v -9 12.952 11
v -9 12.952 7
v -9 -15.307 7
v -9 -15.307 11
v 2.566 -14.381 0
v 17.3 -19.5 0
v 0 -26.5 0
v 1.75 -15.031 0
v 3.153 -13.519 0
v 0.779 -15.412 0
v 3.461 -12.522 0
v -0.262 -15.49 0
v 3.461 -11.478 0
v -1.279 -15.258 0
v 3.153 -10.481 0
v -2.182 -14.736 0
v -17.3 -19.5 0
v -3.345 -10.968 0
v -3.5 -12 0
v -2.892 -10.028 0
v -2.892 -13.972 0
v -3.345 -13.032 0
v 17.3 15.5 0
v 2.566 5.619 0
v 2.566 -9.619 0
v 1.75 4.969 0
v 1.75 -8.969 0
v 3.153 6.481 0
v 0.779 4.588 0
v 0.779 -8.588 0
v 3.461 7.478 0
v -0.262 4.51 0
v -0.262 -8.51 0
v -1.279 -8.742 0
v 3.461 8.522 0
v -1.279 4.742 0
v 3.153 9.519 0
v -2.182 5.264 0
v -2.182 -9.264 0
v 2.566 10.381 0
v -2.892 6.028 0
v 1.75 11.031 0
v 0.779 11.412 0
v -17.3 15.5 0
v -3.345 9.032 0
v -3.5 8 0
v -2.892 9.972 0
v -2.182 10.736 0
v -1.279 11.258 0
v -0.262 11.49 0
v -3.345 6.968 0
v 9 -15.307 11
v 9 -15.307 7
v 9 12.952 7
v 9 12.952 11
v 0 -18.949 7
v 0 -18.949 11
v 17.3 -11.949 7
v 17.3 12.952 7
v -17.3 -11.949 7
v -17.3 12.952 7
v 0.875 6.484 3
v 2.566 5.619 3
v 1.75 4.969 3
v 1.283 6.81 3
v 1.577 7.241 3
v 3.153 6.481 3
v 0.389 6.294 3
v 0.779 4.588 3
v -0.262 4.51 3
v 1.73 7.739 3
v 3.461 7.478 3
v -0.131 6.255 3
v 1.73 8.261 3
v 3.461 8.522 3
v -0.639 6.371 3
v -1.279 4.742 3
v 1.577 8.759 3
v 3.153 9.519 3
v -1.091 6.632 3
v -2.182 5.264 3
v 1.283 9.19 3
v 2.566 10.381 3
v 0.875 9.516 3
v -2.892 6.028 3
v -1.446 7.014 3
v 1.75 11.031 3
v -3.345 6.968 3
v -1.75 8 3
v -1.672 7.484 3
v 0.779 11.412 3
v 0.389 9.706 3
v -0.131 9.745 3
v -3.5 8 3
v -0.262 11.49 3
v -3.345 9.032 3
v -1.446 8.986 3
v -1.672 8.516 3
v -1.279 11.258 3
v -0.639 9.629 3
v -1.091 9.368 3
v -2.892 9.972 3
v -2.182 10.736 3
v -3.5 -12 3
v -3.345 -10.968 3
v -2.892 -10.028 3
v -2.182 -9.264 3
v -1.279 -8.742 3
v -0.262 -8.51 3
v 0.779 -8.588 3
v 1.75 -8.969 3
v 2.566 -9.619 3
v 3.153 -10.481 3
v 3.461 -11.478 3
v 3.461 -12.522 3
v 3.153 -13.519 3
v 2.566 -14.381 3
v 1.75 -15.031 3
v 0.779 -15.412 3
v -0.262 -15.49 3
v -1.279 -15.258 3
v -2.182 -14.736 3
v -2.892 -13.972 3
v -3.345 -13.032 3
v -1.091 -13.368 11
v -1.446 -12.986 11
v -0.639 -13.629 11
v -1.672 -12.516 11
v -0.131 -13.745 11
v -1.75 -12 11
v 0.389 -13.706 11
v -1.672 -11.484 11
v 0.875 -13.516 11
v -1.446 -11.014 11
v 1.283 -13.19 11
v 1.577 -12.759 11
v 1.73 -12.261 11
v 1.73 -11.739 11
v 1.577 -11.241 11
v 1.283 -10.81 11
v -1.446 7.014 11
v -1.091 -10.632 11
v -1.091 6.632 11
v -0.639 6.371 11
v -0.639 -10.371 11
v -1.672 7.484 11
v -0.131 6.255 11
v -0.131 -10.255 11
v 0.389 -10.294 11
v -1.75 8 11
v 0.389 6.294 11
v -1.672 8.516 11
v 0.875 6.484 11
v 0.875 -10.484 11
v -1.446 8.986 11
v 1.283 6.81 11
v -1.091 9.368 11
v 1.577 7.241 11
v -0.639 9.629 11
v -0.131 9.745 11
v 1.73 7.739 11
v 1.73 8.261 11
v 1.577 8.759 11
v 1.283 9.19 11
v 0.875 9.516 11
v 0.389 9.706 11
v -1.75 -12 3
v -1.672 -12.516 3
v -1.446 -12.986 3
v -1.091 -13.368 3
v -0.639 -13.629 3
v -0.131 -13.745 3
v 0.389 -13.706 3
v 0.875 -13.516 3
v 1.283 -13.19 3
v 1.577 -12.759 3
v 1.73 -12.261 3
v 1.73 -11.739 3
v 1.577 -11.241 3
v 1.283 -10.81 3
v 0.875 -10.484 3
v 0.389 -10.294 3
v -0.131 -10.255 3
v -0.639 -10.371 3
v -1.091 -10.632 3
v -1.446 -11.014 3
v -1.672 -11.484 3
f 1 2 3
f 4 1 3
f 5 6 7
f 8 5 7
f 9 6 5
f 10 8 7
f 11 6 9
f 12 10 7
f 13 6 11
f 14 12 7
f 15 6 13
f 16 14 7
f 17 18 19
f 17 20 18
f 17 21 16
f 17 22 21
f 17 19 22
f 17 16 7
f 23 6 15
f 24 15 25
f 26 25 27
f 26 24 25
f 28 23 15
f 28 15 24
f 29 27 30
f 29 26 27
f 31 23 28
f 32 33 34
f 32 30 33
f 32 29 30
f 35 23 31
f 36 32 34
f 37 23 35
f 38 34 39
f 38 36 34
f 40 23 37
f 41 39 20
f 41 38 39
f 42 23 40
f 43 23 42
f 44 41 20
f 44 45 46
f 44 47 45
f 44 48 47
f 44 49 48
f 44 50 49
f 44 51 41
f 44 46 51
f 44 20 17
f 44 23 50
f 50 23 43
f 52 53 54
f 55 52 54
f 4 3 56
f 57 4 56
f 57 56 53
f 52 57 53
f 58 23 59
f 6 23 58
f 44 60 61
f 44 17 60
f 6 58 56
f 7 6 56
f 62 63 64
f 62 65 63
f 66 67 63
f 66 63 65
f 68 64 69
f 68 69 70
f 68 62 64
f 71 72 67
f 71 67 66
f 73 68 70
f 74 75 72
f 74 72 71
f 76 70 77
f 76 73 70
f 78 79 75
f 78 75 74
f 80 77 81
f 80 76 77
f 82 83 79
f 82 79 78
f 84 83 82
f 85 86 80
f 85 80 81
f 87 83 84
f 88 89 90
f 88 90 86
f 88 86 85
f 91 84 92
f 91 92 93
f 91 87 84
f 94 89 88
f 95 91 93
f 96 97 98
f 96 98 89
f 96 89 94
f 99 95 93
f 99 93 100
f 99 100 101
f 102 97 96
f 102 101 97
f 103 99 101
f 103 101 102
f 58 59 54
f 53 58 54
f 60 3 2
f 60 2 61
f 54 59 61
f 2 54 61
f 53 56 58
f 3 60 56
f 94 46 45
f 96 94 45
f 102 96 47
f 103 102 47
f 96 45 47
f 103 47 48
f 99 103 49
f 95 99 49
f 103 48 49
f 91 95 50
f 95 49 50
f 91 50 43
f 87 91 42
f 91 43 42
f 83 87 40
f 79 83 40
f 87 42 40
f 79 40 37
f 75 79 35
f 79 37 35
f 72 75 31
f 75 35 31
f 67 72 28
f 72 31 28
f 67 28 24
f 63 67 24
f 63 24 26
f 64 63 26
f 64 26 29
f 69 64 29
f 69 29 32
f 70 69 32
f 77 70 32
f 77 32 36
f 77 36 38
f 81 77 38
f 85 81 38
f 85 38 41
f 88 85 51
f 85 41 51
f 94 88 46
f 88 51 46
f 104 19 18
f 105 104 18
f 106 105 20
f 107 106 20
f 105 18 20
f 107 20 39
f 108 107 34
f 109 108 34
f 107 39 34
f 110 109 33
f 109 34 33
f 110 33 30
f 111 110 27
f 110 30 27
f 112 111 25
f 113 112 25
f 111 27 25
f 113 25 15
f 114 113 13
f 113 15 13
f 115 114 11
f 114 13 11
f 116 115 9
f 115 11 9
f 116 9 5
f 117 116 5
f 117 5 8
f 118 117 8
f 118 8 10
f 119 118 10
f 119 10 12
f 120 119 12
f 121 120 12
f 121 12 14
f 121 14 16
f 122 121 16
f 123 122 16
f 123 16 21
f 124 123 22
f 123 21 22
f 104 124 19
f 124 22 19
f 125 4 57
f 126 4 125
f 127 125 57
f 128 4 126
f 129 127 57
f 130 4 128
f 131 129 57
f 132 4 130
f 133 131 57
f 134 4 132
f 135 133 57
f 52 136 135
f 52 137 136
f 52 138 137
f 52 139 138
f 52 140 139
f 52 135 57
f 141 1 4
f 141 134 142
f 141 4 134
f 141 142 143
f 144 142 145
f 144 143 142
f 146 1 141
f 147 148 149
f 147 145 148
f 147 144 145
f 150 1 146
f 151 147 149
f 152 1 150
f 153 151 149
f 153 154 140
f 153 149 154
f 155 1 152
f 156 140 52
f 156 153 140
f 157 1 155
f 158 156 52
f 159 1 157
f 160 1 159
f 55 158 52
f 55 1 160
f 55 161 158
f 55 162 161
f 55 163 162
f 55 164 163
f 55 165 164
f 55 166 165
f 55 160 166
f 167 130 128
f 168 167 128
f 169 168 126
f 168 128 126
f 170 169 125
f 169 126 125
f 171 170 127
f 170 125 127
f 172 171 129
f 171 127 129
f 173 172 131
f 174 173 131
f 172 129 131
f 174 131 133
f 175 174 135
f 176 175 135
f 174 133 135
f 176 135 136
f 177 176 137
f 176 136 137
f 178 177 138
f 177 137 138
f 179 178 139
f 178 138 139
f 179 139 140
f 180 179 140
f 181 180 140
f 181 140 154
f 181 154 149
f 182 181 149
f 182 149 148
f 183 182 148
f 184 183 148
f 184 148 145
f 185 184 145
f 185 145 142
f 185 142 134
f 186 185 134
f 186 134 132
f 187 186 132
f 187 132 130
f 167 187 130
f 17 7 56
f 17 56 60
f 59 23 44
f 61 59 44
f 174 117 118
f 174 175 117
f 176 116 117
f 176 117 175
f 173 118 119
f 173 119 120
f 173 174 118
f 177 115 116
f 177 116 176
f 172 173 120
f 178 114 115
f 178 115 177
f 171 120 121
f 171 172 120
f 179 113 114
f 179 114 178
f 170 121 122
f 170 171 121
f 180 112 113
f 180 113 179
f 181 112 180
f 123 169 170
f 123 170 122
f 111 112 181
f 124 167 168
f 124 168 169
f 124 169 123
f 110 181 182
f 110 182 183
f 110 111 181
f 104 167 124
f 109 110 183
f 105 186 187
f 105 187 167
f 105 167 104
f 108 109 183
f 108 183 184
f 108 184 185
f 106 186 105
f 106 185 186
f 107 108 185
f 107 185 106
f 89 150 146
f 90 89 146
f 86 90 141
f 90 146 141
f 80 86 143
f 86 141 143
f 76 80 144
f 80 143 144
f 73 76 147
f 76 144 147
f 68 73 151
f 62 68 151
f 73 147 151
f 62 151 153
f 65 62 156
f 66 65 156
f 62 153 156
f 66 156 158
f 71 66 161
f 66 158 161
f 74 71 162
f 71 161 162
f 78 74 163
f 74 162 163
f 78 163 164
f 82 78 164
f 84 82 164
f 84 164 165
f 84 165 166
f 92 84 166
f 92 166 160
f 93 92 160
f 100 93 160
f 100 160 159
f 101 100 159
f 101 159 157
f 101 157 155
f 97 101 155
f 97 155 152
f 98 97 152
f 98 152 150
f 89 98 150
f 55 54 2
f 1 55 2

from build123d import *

# Parameters (mm, degrees)
ESBO_O1_W                = 34.6
ESBO_O1_H                = 26
RESSALTO_EXTRUS_O1_DEPTH = 7
ESBO_O10_W               = 34.6
ESBO_O10_H               = 2.5
RESSALTO_EXTRUS_O4_DEPTH = 7
CHANFRO1_SIZE            = 7
CHANFRO2_SIZE2           = 7
CHANFRO2_SIZE            = 2.54779164
RESSALTO_EXTRUS_O5_DEPTH = 4
ESBO_O11_R               = 1.75
CORTE_EXTRUS_O1_DEPTH    = 34.504328079
ESBO_O12_R               = 3.5
CORTE_EXTRUS_O2_DEPTH    = 3


with BuildPart() as part:
    # Esboço1 → Ressalto-extrusão1 (new body)
    with BuildSketch(Plane.XY):
        Rectangle(ESBO_O1_W, ESBO_O1_H)
    extrude(amount=RESSALTO_EXTRUS_O1_DEPTH)

    # Esboço10 → Ressalto-extrusão4 (add)
    with BuildSketch(Plane(origin=(0, 0, 0), x_dir=(-1, 0, 0), z_dir=(0, 0, -1))):
        Polygon((-17.3, -19.5), (0, -26.5), (17.3, -19.5), (17.3, -13), (-17.3, -13), align=None)
        with Locations((0, 14.25)):
            Rectangle(ESBO_O10_W, ESBO_O10_H)
    extrude(amount=-RESSALTO_EXTRUS_O4_DEPTH)

    # Chanfro1
    chanfro1_edges = [part.edges().sort_by_distance(p)[0] for p in [
        (8.65, -23, 7),
        (-8.65, -23, 7),
    ]]
    chamfer(chanfro1_edges, length=CHANFRO1_SIZE - 0.0001)  # a hair under: the kernel refuses the full size

    # Chanfro2
    chanfro2_edges = [part.edges().sort_by_distance(p)[0] for p in [
        (0, 15.5, 7),
    ]]
    chanfro2_side = [part.faces().sort_by_distance(p)[0] for p in [
        (0, 15.449044167, 7),
    ]]
    chamfer(chanfro2_edges, length=CHANFRO2_SIZE - 0.0001, length2=CHANFRO2_SIZE2 - 0.0001, reference=chanfro2_side[0])  # a hair under: the kernel refuses the full size

    # Esboço13 → Ressalto-extrusão5 (add)
    with BuildSketch(Plane.XY.offset(7)):
        Polygon((9, -15.307069068), (9, 12.95220836), (-9, 12.95220836), (-9, -15.307069068), (0, -18.948687565), align=None)
    extrude(amount=RESSALTO_EXTRUS_O5_DEPTH)

    # Esboço11 → Corte-extrusão1 (cut, through all)
    with BuildSketch(Plane.XY.offset(11)):
        with Locations(Location((0, -12, 0), (0, 0, 180))):
            Circle(ESBO_O11_R)
        with Locations(Location((0, 8, 0), (0, 0, 180))):
            Circle(ESBO_O11_R)
    extrude(amount=-CORTE_EXTRUS_O1_DEPTH, mode=Mode.SUBTRACT)

    # Esboço12 → Corte-extrusão2 (cut)
    with BuildSketch(Plane(origin=(0, 0, 0), x_dir=(-1, 0, 0), z_dir=(0, 0, -1))):
        with Locations((0, 8)):
            Circle(ESBO_O12_R)
        with Locations((0, -12)):
            Circle(ESBO_O12_R)
    extrude(amount=-CORTE_EXTRUS_O2_DEPTH, mode=Mode.SUBTRACT)


solid = part.part
